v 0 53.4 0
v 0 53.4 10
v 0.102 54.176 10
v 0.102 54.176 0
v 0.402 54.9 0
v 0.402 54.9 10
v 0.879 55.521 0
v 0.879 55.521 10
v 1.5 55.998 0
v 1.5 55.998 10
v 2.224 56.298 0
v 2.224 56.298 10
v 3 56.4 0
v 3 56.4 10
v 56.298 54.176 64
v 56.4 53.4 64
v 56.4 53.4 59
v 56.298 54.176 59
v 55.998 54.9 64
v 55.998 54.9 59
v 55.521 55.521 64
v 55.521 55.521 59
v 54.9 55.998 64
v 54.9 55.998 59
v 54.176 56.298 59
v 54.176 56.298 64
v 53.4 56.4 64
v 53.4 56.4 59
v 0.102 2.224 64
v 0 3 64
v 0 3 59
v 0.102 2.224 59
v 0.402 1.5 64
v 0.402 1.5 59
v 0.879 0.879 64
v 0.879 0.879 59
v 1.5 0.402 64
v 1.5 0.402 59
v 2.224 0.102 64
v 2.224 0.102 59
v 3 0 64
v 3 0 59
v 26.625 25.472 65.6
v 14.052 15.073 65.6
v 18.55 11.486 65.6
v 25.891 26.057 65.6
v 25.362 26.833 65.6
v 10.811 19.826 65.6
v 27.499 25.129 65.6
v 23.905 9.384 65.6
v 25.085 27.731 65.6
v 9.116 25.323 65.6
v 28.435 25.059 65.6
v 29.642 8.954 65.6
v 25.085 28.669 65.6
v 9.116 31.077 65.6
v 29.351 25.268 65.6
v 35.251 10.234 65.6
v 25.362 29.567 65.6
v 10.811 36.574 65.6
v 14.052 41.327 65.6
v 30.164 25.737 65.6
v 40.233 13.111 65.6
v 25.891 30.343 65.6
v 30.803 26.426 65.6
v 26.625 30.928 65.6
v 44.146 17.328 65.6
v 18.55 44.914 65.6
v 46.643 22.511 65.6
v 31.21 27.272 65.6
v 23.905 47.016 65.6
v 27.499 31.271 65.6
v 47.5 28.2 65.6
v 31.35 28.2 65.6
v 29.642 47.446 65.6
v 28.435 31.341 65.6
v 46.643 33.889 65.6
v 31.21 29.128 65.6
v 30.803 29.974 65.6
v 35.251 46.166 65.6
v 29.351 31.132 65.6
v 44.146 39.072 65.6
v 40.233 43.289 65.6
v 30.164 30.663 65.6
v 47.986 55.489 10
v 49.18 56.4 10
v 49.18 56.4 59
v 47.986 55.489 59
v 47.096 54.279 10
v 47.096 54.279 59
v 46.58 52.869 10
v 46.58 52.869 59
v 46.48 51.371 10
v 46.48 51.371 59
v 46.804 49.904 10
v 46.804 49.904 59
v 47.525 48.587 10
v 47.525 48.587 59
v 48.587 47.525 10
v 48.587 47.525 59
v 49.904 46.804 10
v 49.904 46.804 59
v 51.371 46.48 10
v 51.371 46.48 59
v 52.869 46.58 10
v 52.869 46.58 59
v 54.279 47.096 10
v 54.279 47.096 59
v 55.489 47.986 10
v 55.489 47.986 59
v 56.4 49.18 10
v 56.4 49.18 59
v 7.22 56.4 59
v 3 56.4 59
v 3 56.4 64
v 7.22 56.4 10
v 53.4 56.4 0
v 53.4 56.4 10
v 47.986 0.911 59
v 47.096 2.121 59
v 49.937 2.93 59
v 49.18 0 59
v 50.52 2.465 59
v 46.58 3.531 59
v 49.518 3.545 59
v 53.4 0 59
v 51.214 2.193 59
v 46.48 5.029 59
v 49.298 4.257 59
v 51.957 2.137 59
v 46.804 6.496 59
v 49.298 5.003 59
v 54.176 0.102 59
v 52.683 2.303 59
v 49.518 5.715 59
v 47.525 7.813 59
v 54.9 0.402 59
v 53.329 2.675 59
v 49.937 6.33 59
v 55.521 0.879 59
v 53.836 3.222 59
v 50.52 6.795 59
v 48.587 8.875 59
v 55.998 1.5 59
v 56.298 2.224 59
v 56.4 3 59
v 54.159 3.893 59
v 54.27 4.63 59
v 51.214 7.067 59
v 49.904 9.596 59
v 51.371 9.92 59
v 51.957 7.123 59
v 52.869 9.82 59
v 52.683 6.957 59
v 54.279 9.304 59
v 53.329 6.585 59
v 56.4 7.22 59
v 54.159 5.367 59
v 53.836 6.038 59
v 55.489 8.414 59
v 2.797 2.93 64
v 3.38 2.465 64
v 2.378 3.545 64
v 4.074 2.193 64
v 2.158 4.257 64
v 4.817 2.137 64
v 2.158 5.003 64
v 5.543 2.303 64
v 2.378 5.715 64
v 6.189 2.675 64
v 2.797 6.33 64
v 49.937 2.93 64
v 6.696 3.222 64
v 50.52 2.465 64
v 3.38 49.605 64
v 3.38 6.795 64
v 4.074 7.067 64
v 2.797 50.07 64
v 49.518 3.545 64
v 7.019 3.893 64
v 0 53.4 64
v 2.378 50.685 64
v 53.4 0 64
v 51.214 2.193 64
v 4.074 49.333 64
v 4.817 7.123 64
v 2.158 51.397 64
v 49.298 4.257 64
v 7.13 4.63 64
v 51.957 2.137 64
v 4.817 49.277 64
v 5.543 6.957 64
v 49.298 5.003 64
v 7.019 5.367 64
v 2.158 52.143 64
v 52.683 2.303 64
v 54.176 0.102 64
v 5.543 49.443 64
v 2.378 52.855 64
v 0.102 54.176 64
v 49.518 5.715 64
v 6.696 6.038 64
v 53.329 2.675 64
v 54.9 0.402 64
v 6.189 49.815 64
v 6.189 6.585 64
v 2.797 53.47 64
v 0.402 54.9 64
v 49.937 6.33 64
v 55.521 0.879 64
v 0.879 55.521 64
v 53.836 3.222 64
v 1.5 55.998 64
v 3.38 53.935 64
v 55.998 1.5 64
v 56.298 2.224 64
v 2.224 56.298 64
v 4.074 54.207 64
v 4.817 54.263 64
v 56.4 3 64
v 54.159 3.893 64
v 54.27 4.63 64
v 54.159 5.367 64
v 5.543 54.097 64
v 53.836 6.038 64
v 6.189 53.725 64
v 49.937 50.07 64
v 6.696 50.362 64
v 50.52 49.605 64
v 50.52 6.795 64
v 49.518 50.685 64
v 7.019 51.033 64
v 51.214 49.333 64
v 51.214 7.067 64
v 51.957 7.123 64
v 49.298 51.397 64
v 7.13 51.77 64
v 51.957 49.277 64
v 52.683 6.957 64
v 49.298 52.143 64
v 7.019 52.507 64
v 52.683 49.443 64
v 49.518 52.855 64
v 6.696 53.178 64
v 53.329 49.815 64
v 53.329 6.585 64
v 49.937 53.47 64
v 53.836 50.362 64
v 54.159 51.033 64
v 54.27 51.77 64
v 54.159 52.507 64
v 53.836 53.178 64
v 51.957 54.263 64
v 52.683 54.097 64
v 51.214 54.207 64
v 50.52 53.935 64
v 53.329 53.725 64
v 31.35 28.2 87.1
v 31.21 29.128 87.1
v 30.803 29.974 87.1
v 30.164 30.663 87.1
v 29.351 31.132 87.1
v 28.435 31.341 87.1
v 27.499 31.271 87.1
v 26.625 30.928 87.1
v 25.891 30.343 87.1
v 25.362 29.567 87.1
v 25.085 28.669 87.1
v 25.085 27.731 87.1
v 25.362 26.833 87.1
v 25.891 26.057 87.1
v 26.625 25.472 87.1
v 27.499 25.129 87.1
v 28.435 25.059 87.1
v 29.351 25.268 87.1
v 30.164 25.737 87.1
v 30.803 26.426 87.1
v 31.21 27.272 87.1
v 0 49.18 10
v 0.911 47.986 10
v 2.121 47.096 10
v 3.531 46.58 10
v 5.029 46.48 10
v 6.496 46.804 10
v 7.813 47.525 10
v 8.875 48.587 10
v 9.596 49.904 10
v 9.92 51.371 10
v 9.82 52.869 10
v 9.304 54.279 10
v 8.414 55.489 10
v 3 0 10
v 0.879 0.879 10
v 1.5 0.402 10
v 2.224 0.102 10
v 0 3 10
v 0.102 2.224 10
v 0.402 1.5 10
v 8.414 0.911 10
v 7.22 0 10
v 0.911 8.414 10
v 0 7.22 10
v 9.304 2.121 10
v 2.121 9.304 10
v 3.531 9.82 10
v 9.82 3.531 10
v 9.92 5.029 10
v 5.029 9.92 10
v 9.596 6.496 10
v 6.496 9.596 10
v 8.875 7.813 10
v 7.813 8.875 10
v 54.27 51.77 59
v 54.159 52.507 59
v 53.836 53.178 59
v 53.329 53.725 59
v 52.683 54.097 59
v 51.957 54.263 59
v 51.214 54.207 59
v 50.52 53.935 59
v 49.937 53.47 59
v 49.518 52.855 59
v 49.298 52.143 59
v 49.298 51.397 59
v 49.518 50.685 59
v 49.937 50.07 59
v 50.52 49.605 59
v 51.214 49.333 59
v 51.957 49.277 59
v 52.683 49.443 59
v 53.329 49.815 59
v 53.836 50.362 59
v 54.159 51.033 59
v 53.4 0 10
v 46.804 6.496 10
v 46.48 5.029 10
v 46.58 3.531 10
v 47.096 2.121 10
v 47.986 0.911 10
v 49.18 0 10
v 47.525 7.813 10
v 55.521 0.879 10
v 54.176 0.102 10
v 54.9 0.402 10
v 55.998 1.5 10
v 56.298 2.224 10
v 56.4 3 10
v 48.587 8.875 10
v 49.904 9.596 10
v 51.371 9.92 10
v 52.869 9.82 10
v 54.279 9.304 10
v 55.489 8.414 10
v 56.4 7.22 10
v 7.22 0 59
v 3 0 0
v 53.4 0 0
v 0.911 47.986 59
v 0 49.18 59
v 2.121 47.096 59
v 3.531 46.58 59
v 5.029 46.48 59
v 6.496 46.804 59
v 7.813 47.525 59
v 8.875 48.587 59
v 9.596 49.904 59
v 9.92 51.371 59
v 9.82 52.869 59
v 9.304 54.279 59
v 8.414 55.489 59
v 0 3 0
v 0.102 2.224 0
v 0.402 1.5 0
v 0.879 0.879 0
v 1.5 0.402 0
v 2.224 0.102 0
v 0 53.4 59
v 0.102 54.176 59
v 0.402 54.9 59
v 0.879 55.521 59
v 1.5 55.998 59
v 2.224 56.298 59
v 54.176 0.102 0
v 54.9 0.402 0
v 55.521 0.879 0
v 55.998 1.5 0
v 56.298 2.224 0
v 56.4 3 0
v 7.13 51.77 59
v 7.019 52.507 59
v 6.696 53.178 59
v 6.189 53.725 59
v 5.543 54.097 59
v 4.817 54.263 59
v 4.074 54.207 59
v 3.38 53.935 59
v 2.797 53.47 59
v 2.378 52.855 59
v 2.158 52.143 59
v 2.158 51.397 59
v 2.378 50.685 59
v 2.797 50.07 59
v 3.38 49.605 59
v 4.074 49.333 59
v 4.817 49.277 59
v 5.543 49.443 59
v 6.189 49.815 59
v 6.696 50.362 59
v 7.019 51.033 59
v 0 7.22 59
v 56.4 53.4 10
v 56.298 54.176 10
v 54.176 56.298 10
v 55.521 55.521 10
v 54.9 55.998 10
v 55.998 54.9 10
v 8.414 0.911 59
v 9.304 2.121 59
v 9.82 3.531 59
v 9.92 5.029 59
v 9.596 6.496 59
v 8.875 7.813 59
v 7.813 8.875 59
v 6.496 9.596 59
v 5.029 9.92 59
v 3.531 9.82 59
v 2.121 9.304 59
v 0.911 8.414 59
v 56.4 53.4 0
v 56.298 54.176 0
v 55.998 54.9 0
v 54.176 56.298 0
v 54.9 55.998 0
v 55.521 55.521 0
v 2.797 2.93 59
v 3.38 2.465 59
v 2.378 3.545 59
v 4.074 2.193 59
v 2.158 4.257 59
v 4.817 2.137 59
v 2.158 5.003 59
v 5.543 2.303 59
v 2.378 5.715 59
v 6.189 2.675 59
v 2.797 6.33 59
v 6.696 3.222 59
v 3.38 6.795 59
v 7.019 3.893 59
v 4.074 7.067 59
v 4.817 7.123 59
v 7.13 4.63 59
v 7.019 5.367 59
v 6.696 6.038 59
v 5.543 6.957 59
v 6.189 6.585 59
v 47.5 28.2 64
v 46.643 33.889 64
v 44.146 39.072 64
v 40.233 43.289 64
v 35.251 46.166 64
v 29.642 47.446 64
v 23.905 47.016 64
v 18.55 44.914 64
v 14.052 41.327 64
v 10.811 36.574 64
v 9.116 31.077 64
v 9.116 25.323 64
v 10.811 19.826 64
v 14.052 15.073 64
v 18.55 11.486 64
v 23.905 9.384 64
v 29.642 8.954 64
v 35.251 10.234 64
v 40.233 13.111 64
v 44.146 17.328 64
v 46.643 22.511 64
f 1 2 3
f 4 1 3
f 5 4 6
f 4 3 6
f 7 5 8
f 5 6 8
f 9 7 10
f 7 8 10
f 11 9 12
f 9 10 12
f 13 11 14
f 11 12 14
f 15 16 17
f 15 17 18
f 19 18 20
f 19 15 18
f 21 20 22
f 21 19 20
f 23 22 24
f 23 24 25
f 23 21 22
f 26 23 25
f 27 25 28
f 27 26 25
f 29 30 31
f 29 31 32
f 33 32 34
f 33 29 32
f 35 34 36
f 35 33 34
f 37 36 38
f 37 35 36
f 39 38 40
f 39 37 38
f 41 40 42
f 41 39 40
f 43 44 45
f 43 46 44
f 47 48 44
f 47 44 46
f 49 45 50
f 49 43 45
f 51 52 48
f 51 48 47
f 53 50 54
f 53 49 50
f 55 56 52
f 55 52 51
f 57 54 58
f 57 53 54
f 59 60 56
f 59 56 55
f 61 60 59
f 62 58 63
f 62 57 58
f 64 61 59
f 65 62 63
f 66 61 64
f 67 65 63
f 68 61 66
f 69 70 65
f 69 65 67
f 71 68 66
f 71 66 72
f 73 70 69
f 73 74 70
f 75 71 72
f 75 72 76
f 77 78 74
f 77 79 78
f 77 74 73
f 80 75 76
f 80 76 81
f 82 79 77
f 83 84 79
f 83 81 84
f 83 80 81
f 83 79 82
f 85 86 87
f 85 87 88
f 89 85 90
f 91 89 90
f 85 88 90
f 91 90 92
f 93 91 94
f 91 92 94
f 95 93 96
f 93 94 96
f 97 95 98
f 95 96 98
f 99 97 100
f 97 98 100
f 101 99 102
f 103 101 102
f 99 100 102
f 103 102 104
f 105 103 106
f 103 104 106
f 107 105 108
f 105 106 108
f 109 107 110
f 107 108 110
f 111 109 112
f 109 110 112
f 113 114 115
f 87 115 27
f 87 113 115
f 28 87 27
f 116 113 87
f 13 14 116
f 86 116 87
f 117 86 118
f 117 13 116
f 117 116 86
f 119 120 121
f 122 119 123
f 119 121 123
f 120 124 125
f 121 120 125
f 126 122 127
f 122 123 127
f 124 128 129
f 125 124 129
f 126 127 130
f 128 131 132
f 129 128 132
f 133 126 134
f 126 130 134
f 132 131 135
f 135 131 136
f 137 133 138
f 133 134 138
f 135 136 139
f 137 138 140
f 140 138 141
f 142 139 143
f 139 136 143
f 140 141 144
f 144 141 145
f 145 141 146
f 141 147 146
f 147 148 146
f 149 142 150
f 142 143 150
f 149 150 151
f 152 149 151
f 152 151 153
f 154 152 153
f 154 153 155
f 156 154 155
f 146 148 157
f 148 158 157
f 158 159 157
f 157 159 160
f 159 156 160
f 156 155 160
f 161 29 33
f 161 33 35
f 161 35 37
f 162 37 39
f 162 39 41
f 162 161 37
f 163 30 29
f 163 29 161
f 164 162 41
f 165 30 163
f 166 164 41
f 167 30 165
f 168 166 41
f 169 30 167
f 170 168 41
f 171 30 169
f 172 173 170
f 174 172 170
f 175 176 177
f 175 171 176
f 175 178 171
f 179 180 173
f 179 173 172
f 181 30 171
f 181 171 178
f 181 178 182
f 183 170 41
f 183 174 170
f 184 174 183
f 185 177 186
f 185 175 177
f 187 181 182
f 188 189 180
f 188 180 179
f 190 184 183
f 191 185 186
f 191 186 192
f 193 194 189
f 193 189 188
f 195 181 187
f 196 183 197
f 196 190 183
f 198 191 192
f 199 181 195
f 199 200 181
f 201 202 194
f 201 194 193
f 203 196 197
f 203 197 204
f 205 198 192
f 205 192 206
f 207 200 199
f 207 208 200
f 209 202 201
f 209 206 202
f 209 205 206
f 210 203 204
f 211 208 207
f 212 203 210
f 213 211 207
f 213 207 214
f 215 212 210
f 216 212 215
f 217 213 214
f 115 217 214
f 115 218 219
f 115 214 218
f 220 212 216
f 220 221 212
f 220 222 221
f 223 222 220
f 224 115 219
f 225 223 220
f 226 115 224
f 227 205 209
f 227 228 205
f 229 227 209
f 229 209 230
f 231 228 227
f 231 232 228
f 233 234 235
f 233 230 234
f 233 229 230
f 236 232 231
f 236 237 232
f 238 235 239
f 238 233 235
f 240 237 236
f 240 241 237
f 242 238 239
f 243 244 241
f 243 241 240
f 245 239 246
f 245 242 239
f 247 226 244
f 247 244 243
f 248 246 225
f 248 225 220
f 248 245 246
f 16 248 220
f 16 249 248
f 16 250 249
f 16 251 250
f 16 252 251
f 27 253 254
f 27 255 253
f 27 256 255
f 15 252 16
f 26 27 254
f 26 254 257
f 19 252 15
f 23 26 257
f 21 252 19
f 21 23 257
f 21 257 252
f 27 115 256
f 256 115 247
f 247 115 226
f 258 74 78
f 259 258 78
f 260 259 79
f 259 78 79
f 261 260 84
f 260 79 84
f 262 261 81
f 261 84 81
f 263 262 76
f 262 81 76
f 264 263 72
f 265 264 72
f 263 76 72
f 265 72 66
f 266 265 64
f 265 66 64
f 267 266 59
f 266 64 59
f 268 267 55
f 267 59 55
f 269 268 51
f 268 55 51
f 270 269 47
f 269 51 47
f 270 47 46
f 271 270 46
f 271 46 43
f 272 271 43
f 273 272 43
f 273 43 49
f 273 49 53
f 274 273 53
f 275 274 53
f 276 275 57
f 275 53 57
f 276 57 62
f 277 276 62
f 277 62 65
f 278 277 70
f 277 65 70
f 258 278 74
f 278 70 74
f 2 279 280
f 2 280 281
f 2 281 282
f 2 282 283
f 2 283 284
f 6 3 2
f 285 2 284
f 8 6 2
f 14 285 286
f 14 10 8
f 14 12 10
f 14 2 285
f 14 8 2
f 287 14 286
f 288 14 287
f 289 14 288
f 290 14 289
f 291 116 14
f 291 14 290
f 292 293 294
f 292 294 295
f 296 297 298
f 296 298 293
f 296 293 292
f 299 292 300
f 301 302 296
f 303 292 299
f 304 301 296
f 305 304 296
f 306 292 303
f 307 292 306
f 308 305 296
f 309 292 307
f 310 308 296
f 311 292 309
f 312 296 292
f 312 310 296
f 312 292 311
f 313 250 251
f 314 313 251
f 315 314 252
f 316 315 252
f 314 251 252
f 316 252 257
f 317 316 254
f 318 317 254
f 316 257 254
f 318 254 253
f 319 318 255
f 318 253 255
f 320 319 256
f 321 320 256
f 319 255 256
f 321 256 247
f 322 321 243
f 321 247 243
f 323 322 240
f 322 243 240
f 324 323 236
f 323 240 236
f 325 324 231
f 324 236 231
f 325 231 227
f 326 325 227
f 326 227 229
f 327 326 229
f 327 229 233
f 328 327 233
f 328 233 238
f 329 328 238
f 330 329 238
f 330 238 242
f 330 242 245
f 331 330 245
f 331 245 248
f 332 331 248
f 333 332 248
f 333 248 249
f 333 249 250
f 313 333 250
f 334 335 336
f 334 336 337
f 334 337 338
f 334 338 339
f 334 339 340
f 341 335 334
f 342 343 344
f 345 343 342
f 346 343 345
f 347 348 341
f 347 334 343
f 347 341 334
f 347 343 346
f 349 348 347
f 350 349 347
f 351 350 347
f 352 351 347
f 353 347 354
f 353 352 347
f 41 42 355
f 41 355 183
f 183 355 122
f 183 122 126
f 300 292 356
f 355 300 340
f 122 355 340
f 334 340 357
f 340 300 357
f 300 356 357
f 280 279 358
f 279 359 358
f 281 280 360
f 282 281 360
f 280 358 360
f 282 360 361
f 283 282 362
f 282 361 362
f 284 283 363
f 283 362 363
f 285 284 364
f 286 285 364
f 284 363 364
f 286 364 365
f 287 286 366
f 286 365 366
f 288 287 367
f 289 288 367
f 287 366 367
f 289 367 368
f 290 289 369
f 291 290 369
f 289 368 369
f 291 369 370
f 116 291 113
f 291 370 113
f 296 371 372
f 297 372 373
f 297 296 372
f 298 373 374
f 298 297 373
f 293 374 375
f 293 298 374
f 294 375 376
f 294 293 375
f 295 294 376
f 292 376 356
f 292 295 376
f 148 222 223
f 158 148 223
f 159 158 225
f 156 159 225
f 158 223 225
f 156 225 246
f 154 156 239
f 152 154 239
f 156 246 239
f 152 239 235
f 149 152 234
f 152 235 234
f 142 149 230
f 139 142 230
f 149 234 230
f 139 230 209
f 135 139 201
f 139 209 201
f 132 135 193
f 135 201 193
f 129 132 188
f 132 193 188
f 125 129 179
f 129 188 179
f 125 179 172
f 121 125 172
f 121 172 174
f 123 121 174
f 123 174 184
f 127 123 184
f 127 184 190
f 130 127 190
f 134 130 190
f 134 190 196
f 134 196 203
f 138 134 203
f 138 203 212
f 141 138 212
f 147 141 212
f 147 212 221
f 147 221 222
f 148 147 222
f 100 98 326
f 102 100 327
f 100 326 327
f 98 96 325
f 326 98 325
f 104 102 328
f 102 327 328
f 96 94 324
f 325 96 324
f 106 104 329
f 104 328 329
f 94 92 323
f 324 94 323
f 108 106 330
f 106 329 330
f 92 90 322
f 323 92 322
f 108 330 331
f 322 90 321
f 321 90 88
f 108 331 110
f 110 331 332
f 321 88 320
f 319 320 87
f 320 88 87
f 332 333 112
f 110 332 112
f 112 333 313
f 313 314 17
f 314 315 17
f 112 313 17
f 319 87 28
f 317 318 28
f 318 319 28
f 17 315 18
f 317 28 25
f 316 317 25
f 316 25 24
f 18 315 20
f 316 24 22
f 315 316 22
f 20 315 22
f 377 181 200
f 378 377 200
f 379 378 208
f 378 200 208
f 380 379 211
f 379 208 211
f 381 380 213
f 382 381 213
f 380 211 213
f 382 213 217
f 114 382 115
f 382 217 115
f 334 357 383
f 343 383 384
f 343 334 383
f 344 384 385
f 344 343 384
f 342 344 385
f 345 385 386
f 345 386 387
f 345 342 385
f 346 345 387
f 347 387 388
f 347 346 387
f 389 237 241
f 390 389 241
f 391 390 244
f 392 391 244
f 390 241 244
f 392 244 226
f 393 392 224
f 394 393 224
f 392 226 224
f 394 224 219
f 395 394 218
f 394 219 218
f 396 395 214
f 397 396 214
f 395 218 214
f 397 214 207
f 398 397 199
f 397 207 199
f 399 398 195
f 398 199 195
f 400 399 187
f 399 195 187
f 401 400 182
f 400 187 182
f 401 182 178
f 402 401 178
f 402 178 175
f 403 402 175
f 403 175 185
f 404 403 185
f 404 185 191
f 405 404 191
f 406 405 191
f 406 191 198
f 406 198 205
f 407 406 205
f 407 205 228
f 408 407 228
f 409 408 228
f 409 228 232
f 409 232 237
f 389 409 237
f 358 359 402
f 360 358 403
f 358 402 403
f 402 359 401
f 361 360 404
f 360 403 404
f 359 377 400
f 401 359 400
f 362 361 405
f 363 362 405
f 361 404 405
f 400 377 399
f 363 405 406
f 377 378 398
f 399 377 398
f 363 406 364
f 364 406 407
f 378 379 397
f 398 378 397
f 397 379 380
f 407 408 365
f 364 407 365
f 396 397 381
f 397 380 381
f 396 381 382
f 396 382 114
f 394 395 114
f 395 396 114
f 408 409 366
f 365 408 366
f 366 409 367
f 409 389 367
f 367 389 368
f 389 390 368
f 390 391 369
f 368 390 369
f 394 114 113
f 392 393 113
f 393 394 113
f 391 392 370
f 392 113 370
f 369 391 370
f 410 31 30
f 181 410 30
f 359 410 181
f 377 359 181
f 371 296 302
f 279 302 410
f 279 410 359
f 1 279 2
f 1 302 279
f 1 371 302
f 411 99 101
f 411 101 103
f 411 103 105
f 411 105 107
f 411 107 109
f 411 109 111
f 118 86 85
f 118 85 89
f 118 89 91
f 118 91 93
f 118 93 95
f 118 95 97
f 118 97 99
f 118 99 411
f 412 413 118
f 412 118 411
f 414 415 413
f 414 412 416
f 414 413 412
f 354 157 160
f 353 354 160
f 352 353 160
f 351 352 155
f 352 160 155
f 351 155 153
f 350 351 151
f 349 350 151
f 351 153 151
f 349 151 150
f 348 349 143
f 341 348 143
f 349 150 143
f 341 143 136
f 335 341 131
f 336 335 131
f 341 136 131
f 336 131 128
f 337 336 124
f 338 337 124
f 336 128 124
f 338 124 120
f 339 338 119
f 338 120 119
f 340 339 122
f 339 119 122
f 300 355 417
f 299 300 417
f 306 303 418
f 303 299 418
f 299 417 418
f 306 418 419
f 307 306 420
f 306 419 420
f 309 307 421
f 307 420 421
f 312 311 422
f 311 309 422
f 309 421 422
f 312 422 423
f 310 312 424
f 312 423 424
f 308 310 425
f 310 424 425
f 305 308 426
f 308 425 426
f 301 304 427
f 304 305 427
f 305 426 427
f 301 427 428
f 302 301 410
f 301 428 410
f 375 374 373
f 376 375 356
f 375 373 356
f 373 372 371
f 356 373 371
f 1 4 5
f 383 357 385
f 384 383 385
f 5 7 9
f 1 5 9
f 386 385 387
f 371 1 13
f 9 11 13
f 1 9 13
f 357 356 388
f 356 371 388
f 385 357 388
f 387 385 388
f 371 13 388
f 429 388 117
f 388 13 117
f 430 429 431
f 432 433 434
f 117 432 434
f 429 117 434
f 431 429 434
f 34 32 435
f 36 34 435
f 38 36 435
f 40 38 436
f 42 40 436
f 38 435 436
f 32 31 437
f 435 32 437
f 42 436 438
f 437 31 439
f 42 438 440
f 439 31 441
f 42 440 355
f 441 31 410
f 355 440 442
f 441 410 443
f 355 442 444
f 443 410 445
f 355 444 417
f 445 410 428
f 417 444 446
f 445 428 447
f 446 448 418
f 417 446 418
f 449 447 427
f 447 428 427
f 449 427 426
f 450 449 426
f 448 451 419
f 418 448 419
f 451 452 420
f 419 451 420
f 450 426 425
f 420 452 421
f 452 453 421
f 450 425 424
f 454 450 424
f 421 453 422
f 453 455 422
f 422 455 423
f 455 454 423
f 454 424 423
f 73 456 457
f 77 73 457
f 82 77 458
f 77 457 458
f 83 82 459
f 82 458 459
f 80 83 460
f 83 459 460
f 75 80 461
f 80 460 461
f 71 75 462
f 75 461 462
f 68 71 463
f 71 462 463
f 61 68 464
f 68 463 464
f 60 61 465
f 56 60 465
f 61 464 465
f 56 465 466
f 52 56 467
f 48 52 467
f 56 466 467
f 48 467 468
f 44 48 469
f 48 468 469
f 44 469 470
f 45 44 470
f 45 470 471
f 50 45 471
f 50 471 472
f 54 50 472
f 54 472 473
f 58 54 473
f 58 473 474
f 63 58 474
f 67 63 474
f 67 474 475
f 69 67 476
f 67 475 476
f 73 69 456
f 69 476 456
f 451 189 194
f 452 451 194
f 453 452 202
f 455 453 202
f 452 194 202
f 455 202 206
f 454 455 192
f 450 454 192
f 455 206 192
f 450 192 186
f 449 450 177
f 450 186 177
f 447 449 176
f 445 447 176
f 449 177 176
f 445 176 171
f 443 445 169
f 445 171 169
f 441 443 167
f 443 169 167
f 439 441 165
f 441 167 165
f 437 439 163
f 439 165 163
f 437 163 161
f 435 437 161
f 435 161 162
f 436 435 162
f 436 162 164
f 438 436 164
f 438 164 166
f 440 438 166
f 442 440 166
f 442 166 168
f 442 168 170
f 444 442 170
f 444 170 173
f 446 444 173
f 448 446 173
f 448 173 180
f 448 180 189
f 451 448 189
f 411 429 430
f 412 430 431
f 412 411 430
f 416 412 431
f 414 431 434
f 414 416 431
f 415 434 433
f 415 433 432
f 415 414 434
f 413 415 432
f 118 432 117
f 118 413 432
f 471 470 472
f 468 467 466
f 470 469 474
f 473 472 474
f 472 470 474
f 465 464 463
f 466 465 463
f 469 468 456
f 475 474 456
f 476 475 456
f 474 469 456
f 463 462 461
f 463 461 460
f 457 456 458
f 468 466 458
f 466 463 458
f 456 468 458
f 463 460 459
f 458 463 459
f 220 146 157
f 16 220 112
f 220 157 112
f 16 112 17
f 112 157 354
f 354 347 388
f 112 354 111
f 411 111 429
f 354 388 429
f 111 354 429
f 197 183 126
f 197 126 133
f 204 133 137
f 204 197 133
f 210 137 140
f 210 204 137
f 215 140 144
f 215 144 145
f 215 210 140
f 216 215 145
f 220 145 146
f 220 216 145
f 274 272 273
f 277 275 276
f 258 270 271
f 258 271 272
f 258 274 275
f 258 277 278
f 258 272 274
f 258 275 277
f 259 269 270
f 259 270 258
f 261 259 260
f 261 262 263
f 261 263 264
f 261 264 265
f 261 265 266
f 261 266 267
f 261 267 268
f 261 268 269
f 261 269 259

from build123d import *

# Parameters (mm, degrees)
SKETCH1_W          = 56.4
SKETCH1_H          = 56.4
EXTRUDE1_DEPTH     = 64
SKETCH2_R          = 19.3
EXTRUDE2_DEPTH     = 1.6
SKETCH3_R          = 3.15
EXTRUDE3_DEPTH     = 21.5
FILLET1_R          = 3
SKETCH4_R          = 2.5
CUT_EXTRUDE1_DEPTH = 6
SKETCH6_R          = 5.305168107
CUT_EXTRUDE2_DEPTH = 49


with BuildPart() as part:
    # Sketch1 → Extrude1 (new body)
    with BuildSketch(Plane.XY):
        with Locations((28.2, 28.2)):
            Rectangle(SKETCH1_W, SKETCH1_H)
    extrude(amount=EXTRUDE1_DEPTH)

    # Fillet1
    fillet1_edges = [part.edges().sort_by_distance(p)[0] for p in [
        (0, 56.4, 32),
        (56.4, 56.4, 32),
        (56.4, 0, 32),
        (0, 0, 32),
    ]]
    fillet(fillet1_edges, radius=FILLET1_R)

    # Sketch4 → Cut-Extrude1 (cut)
    with BuildSketch(Plane.XY.offset(64)):
        with Locations((4.63, 51.77)):
            Circle(SKETCH4_R)
        with Locations((51.77, 51.77)):
            Circle(SKETCH4_R)
        with Locations((51.77, 4.63)):
            Circle(SKETCH4_R)
        with Locations((4.63, 4.63)):
            Circle(SKETCH4_R)
    extrude(amount=-CUT_EXTRUDE1_DEPTH, mode=Mode.SUBTRACT)

    # Sketch6 → Cut-Extrude2 (cut)
    with BuildSketch(Plane.XY.offset(59)):
        with Locations((4.63, 51.77)):
            Circle(SKETCH6_R)
        with Locations((51.77, 51.77)):
            Circle(SKETCH6_R)
        with Locations((4.63, 4.63)):
            Circle(SKETCH6_R)
        with Locations((51.77, 4.63)):
            Circle(SKETCH6_R)
    extrude(amount=-CUT_EXTRUDE2_DEPTH, mode=Mode.SUBTRACT)


with BuildPart() as body_2:
    # Sketch2 → Extrude2 (new body)
    with BuildSketch(Plane.XY.offset(64)):
        with Locations((28.2, 28.2)):
            Circle(SKETCH2_R)
    extrude(amount=EXTRUDE2_DEPTH)

    # Sketch3 → Extrude3 (add)
    with BuildSketch(Plane.XY.offset(65.6)):
        with Locations((28.2, 28.2)):
            Circle(SKETCH3_R)
    extrude(amount=EXTRUDE3_DEPTH)


solid = Compound([part.part, body_2.part])
